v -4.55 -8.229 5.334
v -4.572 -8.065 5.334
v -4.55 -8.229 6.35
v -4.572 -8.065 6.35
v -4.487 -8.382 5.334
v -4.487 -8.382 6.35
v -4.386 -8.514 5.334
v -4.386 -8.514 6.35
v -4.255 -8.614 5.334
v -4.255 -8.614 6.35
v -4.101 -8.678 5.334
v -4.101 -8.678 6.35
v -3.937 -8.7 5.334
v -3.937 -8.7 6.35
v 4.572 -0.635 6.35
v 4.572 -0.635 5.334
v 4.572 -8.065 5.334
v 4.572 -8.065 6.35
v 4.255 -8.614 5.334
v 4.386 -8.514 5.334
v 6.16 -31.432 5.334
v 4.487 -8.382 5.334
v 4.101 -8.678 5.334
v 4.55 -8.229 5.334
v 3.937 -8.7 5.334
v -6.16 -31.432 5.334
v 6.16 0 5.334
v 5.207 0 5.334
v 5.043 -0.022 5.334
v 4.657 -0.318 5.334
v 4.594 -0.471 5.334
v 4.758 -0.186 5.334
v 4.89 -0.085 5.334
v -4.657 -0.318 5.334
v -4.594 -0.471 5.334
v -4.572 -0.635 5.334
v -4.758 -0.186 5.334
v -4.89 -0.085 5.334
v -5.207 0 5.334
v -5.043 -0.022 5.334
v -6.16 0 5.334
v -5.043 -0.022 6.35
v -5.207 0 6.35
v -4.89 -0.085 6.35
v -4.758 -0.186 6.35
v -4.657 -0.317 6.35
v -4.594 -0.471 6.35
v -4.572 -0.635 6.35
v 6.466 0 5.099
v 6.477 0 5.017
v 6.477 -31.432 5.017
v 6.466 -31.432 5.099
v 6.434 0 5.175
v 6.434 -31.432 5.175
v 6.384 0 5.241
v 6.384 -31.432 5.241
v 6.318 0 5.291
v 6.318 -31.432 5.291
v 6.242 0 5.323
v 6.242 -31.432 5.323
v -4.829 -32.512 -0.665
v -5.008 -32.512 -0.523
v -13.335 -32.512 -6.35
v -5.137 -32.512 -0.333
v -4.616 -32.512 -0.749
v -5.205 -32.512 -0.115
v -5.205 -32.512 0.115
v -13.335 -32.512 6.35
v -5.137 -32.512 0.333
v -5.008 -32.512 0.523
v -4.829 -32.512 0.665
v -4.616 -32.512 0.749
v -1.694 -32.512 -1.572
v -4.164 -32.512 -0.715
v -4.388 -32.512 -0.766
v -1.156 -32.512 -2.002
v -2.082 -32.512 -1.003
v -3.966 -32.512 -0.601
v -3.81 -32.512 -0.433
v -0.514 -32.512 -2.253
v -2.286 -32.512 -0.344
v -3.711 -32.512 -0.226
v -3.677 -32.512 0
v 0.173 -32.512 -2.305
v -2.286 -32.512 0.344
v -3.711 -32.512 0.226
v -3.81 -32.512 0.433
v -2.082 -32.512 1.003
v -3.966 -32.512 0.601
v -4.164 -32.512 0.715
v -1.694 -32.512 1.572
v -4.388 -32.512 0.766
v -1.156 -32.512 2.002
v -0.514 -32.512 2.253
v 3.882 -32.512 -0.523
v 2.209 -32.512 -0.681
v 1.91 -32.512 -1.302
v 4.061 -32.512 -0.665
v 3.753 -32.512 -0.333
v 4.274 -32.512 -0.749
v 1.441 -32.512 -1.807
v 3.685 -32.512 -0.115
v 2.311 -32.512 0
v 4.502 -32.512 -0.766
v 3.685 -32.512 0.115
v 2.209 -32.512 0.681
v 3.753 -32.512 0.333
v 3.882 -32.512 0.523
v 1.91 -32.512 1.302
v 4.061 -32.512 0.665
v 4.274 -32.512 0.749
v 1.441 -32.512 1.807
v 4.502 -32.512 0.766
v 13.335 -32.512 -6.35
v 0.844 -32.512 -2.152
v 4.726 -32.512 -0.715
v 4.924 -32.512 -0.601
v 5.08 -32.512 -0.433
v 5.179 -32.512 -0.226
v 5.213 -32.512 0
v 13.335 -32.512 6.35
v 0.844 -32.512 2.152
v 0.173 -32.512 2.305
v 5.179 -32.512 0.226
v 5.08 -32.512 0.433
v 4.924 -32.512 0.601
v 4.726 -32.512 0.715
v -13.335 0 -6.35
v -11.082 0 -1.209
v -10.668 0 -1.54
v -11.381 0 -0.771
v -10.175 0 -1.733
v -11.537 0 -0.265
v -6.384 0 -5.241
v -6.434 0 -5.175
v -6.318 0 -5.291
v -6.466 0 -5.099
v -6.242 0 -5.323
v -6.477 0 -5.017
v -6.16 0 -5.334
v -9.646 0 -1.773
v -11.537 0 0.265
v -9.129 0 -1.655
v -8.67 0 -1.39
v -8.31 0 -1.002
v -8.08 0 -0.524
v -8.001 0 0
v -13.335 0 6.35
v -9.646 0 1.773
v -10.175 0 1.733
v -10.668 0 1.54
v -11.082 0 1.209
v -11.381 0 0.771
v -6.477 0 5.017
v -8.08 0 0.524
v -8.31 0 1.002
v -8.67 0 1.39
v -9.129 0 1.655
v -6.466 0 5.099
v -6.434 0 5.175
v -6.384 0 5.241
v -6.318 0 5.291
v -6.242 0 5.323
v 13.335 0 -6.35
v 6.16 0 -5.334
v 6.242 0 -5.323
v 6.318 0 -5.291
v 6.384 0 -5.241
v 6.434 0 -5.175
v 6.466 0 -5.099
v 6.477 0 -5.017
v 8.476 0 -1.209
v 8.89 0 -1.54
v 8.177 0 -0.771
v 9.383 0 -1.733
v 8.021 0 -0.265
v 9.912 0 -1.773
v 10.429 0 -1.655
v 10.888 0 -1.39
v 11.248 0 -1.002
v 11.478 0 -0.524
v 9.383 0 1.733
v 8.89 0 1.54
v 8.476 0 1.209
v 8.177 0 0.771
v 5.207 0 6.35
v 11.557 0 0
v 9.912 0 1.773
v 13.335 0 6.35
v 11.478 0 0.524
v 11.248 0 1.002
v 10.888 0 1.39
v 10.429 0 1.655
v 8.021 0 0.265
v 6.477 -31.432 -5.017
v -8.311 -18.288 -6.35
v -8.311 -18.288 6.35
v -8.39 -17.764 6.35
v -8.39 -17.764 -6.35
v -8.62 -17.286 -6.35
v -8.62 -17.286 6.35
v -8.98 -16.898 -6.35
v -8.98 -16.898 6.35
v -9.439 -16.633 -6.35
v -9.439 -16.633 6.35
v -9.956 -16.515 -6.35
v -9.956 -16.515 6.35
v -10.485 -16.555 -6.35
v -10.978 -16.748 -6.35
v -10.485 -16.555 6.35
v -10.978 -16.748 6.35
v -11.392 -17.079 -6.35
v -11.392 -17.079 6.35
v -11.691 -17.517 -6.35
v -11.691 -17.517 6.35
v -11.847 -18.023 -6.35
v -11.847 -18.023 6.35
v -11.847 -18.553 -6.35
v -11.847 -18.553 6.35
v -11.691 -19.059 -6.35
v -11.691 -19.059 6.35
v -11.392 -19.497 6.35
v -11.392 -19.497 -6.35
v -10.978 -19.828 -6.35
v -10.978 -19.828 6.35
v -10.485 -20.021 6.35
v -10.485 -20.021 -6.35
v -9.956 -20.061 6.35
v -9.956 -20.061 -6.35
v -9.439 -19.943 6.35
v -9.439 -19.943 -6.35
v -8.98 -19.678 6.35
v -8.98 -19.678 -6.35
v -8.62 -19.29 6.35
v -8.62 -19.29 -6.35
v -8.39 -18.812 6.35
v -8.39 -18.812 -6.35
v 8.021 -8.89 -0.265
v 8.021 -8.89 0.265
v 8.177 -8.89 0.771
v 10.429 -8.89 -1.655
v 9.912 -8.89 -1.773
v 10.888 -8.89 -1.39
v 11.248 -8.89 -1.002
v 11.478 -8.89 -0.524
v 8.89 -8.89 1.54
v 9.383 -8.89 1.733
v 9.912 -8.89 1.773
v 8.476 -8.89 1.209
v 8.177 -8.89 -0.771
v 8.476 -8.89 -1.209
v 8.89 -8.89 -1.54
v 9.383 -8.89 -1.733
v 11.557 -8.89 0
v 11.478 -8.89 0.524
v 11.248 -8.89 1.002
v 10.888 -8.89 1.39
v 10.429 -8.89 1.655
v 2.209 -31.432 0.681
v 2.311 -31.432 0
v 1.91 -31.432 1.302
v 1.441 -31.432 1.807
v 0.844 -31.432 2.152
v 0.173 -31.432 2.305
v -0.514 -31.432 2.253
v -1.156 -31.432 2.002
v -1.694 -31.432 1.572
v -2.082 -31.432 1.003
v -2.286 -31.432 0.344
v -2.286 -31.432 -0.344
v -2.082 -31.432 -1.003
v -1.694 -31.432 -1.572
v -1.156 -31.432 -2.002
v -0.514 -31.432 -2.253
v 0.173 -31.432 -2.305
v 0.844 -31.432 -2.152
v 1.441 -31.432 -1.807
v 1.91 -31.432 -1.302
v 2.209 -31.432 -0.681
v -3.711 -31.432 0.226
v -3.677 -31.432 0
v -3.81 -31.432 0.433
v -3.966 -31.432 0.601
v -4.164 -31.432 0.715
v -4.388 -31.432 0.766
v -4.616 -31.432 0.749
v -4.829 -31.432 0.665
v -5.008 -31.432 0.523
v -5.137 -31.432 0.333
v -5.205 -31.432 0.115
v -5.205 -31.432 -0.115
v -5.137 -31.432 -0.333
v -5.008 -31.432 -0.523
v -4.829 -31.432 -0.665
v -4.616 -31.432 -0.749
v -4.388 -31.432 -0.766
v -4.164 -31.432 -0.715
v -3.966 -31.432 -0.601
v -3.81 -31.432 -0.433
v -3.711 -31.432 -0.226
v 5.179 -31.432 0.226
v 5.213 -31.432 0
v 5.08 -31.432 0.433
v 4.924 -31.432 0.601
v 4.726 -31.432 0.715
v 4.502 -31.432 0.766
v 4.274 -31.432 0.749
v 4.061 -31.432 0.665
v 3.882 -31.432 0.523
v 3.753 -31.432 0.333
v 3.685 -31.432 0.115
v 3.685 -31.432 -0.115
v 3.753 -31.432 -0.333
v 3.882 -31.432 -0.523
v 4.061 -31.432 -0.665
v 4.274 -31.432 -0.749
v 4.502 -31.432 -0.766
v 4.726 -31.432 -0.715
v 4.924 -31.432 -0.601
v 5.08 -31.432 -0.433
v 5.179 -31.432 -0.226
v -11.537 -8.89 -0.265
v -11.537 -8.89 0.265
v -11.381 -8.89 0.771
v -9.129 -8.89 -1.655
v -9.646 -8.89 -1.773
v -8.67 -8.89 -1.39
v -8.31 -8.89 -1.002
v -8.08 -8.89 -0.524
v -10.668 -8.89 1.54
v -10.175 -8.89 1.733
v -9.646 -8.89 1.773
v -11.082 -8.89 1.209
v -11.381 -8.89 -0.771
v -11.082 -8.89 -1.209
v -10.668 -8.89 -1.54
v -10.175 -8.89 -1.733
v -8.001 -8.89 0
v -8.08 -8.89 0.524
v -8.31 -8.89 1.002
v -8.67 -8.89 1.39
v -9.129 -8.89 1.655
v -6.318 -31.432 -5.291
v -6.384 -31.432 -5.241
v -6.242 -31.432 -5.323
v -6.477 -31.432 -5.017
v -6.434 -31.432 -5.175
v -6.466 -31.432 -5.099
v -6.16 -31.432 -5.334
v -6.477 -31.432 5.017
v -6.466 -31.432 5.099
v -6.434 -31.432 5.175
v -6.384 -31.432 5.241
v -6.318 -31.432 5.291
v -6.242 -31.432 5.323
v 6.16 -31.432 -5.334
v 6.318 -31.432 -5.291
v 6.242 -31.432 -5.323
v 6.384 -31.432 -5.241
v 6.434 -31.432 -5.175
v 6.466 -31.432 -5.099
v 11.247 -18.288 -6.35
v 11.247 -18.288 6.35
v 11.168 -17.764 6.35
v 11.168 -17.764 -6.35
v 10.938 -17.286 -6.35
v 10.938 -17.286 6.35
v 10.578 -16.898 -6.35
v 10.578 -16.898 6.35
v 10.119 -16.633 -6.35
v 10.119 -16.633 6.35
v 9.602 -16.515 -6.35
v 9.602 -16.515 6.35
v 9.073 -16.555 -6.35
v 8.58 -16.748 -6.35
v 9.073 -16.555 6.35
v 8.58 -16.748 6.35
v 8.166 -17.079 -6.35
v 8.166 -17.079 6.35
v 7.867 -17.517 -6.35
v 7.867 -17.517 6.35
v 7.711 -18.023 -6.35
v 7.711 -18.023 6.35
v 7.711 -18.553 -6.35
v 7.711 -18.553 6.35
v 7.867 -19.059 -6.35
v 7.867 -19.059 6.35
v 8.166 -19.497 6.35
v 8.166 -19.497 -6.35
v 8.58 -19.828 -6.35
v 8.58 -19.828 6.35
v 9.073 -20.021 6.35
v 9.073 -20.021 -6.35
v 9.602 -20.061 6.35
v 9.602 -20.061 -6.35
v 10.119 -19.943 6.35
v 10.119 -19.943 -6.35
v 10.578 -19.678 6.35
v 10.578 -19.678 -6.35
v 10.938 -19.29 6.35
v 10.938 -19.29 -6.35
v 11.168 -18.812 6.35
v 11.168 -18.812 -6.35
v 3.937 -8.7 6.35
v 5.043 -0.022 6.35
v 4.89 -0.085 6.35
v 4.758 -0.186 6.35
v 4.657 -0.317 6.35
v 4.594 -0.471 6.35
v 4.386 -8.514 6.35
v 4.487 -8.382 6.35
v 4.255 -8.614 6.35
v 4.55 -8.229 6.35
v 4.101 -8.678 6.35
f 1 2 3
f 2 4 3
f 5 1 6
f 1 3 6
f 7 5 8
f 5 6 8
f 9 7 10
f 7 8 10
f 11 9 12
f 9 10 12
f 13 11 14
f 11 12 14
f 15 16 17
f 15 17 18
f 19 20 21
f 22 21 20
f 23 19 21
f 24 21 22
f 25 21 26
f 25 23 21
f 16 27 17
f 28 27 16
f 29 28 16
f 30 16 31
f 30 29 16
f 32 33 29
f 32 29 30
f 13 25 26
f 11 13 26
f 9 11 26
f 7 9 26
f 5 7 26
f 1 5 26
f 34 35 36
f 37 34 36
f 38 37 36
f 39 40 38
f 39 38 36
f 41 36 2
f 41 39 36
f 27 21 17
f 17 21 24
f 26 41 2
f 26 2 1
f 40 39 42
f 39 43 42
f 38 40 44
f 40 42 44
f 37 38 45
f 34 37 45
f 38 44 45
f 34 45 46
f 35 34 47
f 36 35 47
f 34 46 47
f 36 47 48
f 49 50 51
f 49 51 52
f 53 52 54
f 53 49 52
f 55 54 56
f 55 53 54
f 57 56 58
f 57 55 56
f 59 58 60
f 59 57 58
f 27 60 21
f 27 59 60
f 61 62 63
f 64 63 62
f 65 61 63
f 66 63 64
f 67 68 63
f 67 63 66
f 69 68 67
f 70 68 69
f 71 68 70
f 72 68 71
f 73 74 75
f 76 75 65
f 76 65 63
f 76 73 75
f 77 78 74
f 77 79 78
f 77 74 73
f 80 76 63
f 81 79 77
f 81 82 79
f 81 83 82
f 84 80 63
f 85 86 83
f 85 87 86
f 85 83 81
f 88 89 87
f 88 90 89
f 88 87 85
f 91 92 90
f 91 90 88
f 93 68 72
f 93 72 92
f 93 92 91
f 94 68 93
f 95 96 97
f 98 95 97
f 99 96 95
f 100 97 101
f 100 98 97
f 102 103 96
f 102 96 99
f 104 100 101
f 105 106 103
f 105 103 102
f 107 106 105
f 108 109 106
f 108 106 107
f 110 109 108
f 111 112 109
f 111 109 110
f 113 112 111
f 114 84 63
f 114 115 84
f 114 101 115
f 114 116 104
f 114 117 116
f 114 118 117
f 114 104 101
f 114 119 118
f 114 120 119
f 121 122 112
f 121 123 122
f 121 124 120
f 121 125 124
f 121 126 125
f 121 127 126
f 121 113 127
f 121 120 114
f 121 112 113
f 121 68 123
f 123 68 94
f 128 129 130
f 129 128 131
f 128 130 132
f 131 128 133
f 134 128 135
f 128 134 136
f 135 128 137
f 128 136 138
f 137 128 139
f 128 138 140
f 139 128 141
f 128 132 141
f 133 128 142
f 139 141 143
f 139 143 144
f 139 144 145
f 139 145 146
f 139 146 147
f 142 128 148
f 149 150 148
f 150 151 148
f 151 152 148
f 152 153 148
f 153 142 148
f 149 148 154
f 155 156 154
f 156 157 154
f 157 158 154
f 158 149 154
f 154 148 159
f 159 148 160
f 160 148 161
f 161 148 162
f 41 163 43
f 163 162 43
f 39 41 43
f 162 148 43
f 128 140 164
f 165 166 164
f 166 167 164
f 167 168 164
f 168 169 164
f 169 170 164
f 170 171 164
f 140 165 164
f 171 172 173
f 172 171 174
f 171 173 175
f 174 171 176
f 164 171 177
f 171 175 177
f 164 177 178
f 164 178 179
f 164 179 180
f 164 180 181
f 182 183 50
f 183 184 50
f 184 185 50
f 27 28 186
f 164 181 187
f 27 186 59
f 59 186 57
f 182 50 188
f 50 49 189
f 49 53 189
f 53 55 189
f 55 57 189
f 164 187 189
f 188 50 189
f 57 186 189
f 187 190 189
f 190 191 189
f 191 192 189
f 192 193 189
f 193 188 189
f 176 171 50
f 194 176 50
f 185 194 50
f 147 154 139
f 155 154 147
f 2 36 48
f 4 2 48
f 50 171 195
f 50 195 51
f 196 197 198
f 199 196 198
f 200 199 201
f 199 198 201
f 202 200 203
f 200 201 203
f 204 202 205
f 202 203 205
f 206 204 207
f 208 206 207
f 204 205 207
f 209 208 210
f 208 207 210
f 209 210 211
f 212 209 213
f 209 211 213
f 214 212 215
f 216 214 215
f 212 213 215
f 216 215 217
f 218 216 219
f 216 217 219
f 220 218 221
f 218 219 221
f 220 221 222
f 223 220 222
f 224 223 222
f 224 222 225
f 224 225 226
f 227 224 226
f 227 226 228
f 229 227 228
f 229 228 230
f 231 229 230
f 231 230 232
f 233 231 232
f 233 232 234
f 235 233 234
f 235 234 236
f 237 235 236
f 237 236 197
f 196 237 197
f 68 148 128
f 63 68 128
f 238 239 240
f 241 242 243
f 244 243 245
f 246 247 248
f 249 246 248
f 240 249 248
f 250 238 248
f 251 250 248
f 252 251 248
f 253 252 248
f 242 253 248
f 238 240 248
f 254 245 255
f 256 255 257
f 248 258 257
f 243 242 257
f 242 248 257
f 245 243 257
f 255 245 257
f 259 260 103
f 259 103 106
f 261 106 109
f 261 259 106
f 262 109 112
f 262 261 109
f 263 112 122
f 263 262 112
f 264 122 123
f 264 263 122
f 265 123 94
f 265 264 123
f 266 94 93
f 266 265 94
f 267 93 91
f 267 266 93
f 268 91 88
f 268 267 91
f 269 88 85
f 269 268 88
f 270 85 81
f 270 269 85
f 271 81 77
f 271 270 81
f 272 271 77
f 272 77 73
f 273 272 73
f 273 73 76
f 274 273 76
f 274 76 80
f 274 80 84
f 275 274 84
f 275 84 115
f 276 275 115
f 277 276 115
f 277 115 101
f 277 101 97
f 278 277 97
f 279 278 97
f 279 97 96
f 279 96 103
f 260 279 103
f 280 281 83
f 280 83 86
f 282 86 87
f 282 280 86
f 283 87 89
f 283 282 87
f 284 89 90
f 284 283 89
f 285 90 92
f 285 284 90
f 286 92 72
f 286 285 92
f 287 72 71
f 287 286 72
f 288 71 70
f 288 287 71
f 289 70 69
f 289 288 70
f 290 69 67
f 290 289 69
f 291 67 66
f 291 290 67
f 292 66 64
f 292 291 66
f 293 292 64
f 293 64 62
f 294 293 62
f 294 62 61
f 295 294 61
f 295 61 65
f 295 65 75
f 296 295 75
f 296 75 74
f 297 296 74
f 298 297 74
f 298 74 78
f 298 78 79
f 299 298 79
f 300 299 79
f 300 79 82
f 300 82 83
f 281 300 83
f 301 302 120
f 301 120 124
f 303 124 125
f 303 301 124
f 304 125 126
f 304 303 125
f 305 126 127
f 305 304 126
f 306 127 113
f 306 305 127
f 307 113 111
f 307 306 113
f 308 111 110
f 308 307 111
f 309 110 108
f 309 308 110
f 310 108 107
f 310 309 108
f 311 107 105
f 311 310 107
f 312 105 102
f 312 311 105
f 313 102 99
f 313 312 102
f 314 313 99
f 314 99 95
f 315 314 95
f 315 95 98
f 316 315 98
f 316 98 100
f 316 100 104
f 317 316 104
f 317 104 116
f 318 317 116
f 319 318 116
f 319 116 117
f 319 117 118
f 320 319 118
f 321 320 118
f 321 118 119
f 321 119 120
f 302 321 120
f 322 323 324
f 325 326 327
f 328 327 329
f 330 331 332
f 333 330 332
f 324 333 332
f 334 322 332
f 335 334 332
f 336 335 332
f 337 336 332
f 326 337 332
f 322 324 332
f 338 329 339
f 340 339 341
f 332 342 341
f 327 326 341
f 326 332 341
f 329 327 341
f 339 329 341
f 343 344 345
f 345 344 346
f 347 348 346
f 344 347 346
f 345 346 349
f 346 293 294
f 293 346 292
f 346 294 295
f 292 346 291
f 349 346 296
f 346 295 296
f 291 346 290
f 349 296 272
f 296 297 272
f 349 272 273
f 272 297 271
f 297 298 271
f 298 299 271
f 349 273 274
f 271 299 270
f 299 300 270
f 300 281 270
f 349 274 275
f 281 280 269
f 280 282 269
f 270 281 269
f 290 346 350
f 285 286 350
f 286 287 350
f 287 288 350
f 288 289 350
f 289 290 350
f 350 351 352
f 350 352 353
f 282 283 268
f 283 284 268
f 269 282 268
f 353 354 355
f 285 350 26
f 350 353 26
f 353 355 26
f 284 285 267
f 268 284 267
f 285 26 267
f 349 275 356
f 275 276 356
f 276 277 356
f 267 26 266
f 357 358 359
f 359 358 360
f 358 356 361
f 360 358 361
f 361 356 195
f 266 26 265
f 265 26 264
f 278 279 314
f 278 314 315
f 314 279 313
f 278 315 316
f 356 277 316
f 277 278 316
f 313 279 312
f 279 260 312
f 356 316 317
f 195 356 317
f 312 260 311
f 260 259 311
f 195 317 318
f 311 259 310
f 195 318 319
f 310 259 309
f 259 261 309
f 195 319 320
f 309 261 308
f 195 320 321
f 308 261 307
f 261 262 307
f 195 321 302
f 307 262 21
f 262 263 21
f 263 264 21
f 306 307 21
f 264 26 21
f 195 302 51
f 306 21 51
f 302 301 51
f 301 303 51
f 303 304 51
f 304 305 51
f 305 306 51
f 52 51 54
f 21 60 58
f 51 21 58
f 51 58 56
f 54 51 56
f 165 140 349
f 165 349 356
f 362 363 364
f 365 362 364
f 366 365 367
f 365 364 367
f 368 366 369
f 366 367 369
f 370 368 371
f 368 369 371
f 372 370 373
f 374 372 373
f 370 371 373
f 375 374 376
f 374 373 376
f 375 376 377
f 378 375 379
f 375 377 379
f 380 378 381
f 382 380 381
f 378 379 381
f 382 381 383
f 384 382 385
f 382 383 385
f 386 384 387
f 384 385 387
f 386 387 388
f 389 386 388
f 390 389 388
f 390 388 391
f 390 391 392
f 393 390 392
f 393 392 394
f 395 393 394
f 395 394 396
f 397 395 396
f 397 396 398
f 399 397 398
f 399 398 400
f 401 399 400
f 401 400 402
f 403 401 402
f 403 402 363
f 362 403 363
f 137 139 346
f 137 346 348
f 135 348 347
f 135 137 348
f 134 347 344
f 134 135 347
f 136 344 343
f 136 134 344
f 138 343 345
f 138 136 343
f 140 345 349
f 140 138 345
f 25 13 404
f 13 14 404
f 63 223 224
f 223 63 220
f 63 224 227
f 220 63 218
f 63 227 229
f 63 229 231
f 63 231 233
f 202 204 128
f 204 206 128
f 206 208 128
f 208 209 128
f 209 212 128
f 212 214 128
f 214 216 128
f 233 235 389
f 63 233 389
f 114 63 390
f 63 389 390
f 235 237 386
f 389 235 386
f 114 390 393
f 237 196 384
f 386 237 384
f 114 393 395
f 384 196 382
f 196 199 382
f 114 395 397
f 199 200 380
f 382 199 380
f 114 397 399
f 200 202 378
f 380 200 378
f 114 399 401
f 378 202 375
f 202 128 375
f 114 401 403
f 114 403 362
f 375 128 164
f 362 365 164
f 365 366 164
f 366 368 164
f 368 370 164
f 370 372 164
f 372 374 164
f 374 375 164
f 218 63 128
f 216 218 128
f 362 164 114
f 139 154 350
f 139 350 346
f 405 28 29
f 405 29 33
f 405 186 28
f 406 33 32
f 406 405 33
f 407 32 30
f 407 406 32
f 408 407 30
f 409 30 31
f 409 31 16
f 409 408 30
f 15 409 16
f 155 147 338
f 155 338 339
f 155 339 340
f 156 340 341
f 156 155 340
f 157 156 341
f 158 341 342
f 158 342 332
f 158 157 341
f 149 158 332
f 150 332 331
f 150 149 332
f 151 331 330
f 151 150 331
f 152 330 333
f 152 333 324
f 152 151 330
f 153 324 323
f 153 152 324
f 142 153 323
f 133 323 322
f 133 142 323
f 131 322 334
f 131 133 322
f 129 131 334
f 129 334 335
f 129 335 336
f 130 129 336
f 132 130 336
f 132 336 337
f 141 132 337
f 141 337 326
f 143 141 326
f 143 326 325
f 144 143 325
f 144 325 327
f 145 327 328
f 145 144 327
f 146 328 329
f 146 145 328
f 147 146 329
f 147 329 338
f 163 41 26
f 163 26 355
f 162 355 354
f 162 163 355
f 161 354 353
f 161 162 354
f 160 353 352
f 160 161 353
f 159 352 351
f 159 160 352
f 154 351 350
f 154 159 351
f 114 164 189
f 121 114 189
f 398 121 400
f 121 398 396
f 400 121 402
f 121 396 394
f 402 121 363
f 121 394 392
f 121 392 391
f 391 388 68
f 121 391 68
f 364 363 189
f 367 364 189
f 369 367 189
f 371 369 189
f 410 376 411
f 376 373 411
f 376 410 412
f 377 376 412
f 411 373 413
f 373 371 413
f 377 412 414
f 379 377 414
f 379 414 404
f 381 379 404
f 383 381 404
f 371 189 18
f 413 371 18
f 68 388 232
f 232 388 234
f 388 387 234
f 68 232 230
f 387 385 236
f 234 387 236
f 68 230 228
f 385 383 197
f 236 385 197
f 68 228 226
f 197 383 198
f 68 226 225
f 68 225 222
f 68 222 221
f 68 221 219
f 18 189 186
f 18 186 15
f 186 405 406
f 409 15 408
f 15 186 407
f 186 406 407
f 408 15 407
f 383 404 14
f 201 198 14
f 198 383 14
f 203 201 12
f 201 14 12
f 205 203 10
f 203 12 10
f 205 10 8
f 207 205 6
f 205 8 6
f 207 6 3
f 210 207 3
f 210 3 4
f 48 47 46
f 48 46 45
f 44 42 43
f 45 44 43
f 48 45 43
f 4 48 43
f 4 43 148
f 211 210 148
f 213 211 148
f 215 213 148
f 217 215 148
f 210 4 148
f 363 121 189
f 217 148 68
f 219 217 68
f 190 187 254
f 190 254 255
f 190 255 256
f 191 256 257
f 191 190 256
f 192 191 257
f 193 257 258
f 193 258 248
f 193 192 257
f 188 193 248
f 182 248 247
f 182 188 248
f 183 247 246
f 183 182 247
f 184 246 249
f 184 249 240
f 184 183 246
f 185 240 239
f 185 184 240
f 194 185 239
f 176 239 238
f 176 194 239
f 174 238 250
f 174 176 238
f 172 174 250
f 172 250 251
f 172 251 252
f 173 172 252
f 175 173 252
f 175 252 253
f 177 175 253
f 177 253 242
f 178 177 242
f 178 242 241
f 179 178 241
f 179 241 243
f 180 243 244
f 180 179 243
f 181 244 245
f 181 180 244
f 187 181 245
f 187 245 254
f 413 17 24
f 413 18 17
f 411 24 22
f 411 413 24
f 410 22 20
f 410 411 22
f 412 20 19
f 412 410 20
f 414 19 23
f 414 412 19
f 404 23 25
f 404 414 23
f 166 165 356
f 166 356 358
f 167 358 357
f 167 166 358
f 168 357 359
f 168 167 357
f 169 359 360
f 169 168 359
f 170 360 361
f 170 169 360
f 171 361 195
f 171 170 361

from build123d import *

# Parameters (mm, degrees)
F0_R     = 1.778
F0_W     = 9.144
F0_H     = 1.016
F0_R_2   = 0.76835
F0_R_3   = 2.3114
F1_DEPTH = 32.512
F2_DEPTH = 31.4325
F3_DEPTH = 8.6995
F4_DEPTH = 8.89
F5_R     = 1.778
F6_DEPTH = 12.701
F7_R     = 0.635


with BuildPart() as f1:
    # F0 (on Front) → F1 (new body)
    with BuildSketch(Plane.XZ):
        with BuildLine():
            Line((-13.335, -6.35), (13.335, -6.35))
            Line((13.335, -6.35), (13.335, 6.35))
            Line((13.335, 6.35), (4.572, 6.35))
            Line((4.572, 6.35), (4.572, 5.334))
            Line((4.572, 5.334), (6.159687, 5.334))
            ThreePointArc((6.159687, 5.334), (6.384061, 5.241061), (6.477, 5.016687))
            Line((6.477, 5.016687), (6.477, -5.016687))
            ThreePointArc((6.477, -5.016687), (6.384061, -5.241061), (6.159687, -5.334))
            Line((6.159687, -5.334), (-6.159687, -5.334))
            ThreePointArc((-6.159687, -5.334), (-6.384061, -5.241061), (-6.477, -5.016687))
            Line((-6.477, -5.016687), (-6.477, 5.016687))
            ThreePointArc((-6.477, 5.016687), (-6.384061, 5.241061), (-6.159687, 5.334))
            Line((-6.159687, 5.334), (-4.572, 5.334))
            Line((-4.572, 5.334), (-4.572, 6.35))
            Line((-4.572, 6.35), (-13.335, 6.35))
            Line((-13.335, 6.35), (-13.335, -6.35))
        make_face()
        with Locations((-9.779, 0)):
            Circle(F0_R, mode=Mode.SUBTRACT)
        with Locations((9.779, 0)):
            Circle(F0_R, mode=Mode.SUBTRACT)
        with Locations((0, 5.842)):
            Rectangle(F0_W, F0_H)
        with BuildLine():
            Line((6.159687, 5.334), (4.572, 5.334))
            Line((4.572, 5.334), (-4.572, 5.334))
            Line((-4.572, 5.334), (-6.159687, 5.334))
            ThreePointArc((-6.159687, 5.334), (-6.384061, 5.241061), (-6.477, 5.016687))
            Line((-6.477, 5.016687), (-6.477, -5.016687))
            ThreePointArc((-6.477, -5.016687), (-6.384061, -5.241061), (-6.159687, -5.334))
            Line((-6.159687, -5.334), (6.159687, -5.334))
            ThreePointArc((6.159687, -5.334), (6.384061, -5.241061), (6.477, -5.016687))
            Line((6.477, -5.016687), (6.477, 5.016687))
            ThreePointArc((6.477, 5.016687), (6.384061, 5.241061), (6.159687, 5.334))
        make_face()
        with Locations((-4.445, 0)):
            Circle(F0_R_2, mode=Mode.SUBTRACT)
        Circle(F0_R_3, mode=Mode.SUBTRACT)
        with Locations((4.445, 0)):
            Circle(F0_R_2, mode=Mode.SUBTRACT)
        with Locations((-9.779, 0)):
            Circle(F0_R)
        with Locations((9.779, 0)):
            Circle(F0_R)
    extrude(amount=F1_DEPTH)

    # F0 (on Front) → F2 (cut)
    with BuildSketch(Plane.XZ):
        with BuildLine():
            Line((6.159687, 5.334), (4.572, 5.334))
            Line((4.572, 5.334), (-4.572, 5.334))
            Line((-4.572, 5.334), (-6.159687, 5.334))
            ThreePointArc((-6.159687, 5.334), (-6.384061, 5.241061), (-6.477, 5.016687))
            Line((-6.477, 5.016687), (-6.477, -5.016687))
            ThreePointArc((-6.477, -5.016687), (-6.384061, -5.241061), (-6.159687, -5.334))
            Line((-6.159687, -5.334), (6.159687, -5.334))
            ThreePointArc((6.159687, -5.334), (6.384061, -5.241061), (6.477, -5.016687))
            Line((6.477, -5.016687), (6.477, 5.016687))
            ThreePointArc((6.477, 5.016687), (6.384061, 5.241061), (6.159687, 5.334))
        make_face()
        with Locations((-4.445, 0)):
            Circle(F0_R_2, mode=Mode.SUBTRACT)
        Circle(F0_R_3, mode=Mode.SUBTRACT)
        with Locations((4.445, 0)):
            Circle(F0_R_2, mode=Mode.SUBTRACT)
    extrude(amount=F2_DEPTH, mode=Mode.SUBTRACT)

    # F0 (on Front) → F3 (cut)
    with BuildSketch(Plane.XZ):
        with Locations((0, 5.842)):
            Rectangle(F0_W, F0_H)
    extrude(amount=F3_DEPTH, mode=Mode.SUBTRACT)

    # F0 (on Front) → F4 (cut)
    with BuildSketch(Plane.XZ):
        with Locations((9.779, 0)):
            Circle(F0_R)
        with Locations((-9.779, 0)):
            Circle(F0_R)
    extrude(amount=F4_DEPTH, mode=Mode.SUBTRACT)

    # F5 (on face) → F6 (cut, through all)
    with BuildSketch(Plane.XY.offset(6.35)):
        with Locations((-10.089038, -18.288)):
            Circle(F5_R)
        with Locations((9.468962, -18.288)):
            Circle(F5_R)
    extrude(amount=-F6_DEPTH, mode=Mode.SUBTRACT)

    # F7
    f7_edges = [f1.edges().sort_by_distance(p)[0] for p in [
        (-4.572, -8.6995, 5.842),
        (4.572, -8.6995, 5.842),
        (4.572, 0, 5.842),
        (-4.572, 0, 5.842),
    ]]
    fillet(f7_edges, radius=F7_R)


solid = f1.part
